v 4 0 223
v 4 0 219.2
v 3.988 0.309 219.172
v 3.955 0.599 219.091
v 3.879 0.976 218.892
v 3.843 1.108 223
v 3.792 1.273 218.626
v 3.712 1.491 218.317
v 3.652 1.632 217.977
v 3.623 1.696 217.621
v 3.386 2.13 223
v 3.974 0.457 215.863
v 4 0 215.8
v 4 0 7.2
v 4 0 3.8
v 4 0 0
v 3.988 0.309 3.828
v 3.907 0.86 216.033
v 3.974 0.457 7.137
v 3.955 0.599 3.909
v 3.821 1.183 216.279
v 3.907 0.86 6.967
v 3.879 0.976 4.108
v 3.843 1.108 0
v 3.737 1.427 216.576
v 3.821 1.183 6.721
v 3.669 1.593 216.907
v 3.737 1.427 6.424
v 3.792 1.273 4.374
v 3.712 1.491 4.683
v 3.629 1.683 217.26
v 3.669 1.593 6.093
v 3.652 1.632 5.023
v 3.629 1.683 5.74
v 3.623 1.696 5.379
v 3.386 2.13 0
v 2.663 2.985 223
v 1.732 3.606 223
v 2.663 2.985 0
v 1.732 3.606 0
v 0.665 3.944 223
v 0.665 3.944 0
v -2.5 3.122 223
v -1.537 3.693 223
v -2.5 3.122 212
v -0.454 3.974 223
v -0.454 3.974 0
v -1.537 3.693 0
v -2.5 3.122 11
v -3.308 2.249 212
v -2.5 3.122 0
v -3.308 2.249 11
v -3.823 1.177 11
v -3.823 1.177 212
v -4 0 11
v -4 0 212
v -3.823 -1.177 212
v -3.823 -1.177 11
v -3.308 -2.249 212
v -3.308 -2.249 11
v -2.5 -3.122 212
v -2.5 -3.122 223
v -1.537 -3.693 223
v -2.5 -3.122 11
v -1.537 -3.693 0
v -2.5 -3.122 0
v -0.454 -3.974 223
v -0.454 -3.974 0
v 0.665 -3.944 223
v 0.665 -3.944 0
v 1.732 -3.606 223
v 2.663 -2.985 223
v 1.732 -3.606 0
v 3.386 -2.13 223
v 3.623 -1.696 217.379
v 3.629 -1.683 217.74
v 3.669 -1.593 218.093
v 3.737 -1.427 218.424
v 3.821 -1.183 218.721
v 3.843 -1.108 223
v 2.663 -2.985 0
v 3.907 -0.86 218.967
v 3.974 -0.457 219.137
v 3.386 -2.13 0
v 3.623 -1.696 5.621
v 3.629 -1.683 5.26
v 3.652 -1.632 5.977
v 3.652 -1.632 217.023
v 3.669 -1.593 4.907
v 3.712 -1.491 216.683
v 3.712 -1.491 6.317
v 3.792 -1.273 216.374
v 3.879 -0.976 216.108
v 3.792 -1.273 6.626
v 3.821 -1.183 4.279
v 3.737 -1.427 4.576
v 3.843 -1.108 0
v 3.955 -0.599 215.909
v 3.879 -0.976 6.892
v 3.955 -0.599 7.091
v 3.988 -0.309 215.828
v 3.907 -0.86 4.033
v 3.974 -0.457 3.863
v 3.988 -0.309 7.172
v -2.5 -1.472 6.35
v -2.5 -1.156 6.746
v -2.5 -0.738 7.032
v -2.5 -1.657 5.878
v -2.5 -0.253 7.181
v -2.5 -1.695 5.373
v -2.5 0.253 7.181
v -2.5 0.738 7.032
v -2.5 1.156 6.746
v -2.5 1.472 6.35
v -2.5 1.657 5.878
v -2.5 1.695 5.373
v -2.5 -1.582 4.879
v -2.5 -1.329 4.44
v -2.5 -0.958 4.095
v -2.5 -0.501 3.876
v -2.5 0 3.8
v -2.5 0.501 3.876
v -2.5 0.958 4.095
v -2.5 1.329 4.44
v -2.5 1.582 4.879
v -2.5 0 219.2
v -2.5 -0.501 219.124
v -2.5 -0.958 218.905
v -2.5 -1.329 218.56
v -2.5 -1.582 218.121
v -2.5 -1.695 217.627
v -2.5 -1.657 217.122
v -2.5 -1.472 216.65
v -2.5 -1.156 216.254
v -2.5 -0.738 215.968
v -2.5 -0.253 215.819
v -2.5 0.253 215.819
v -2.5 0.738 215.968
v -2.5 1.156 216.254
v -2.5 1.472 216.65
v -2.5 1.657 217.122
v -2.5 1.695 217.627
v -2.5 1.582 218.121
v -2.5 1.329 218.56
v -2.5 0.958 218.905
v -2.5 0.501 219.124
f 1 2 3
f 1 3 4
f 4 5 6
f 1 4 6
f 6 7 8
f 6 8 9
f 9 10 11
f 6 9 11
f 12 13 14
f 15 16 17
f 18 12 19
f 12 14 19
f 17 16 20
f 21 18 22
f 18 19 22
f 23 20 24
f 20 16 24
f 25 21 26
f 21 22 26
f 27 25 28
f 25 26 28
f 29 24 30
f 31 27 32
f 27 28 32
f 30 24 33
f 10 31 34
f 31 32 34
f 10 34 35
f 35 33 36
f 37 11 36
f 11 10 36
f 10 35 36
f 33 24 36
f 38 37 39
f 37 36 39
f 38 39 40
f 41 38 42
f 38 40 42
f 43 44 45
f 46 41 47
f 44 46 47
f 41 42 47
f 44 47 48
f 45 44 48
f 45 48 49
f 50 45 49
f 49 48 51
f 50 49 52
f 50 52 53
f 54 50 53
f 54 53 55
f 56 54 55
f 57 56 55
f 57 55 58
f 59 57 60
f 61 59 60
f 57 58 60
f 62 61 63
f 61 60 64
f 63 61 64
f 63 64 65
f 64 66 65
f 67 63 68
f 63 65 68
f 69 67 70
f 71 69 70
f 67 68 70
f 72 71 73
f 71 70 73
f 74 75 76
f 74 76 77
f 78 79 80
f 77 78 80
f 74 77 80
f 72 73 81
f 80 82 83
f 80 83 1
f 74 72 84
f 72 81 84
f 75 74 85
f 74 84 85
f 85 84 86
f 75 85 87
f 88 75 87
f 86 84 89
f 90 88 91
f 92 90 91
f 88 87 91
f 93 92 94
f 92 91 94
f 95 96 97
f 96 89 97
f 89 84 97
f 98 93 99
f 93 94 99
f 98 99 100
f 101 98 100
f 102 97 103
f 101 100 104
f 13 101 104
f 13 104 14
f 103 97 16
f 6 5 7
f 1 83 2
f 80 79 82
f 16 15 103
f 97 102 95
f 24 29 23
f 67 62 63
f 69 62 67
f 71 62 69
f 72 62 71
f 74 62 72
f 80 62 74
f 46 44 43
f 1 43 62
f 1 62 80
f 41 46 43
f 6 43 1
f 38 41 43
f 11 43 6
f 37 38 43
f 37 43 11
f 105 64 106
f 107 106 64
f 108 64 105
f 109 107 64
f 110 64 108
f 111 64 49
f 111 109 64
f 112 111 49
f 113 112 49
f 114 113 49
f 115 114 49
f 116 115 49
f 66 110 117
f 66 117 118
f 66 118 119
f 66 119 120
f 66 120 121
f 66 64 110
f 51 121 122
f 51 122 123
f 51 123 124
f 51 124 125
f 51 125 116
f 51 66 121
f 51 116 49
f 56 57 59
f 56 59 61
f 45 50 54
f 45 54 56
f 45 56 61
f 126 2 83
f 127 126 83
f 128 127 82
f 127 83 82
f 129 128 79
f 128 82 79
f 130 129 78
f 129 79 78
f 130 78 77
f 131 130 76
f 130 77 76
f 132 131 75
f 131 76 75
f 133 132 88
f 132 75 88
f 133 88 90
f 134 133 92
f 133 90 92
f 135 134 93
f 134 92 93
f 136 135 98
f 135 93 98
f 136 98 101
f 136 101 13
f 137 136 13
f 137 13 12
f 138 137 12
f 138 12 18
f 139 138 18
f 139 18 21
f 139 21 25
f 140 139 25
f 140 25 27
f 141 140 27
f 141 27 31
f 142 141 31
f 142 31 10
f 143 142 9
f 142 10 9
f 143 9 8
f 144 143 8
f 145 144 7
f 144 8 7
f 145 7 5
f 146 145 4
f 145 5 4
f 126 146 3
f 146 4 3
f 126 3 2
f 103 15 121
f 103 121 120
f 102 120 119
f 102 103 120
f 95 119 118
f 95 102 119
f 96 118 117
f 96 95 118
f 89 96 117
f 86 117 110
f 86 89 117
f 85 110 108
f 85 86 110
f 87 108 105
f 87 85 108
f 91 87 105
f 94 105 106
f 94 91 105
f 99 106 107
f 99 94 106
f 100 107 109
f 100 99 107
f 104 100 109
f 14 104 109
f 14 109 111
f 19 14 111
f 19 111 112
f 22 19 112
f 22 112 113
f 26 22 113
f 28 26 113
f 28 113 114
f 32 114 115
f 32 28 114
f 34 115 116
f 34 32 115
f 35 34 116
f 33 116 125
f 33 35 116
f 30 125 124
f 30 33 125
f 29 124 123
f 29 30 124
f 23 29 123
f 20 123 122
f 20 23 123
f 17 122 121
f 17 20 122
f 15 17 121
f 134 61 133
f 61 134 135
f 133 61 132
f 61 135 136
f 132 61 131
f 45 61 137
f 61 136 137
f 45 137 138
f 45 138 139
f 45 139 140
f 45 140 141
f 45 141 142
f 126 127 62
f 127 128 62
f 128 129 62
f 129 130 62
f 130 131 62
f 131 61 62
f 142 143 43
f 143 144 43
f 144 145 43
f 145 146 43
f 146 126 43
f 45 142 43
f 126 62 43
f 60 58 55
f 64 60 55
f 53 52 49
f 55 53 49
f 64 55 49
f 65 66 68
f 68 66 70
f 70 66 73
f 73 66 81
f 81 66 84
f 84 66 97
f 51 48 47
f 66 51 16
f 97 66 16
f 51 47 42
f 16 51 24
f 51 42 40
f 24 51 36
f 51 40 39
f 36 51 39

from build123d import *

# Parameters (mm, degrees)
CROQUIS1_R                   = 4
SALIENTE_EXTRUIR1_DEPTH      = 223
CORTAR_EXTRUIR1_DEPTH        = 11
TALADRO_DE_MARGEN_PARA_M31_D = 3.4


with BuildPart() as part:
    # Croquis1 → Saliente-Extruir1 (new body)
    with BuildSketch(Plane.XY):
        Circle(CROQUIS1_R)
    extrude(amount=SALIENTE_EXTRUIR1_DEPTH)

    # Croquis2 → Cortar-Extruir1 (cut)
    with BuildSketch(Plane.XY.offset(223)):
        with BuildLine():
            Line((-2.5, -3.122498999), (-2.5, 3.122498999))
            ThreePointArc((-2.5, 3.122498999), (-4, 0), (-2.5, -3.122498999))
        make_face()
    cortar_extruir1 = extrude(amount=-CORTAR_EXTRUIR1_DEPTH, mode=Mode.SUBTRACT)

    # Simetría1: Cortar-Extruir1 across plane
    add(cortar_extruir1.mirror(Plane.XY.offset(111.5)), mode=Mode.SUBTRACT)

    # Taladro de margen para M31 (through all)
    with Locations(Plane(origin=(-2.5, 0, 217.5), x_dir=(0, 0, -1), z_dir=(-1, 0, 0))):
        with Locations((0, 0)):
            taladro_de_margen_para_m31 = Hole(TALADRO_DE_MARGEN_PARA_M31_D / 2)

    # Simetría3: Taladro de margen para M31 across plane
    add(taladro_de_margen_para_m31.mirror(Plane.XY.offset(111.5)), mode=Mode.SUBTRACT)


solid = part.part
